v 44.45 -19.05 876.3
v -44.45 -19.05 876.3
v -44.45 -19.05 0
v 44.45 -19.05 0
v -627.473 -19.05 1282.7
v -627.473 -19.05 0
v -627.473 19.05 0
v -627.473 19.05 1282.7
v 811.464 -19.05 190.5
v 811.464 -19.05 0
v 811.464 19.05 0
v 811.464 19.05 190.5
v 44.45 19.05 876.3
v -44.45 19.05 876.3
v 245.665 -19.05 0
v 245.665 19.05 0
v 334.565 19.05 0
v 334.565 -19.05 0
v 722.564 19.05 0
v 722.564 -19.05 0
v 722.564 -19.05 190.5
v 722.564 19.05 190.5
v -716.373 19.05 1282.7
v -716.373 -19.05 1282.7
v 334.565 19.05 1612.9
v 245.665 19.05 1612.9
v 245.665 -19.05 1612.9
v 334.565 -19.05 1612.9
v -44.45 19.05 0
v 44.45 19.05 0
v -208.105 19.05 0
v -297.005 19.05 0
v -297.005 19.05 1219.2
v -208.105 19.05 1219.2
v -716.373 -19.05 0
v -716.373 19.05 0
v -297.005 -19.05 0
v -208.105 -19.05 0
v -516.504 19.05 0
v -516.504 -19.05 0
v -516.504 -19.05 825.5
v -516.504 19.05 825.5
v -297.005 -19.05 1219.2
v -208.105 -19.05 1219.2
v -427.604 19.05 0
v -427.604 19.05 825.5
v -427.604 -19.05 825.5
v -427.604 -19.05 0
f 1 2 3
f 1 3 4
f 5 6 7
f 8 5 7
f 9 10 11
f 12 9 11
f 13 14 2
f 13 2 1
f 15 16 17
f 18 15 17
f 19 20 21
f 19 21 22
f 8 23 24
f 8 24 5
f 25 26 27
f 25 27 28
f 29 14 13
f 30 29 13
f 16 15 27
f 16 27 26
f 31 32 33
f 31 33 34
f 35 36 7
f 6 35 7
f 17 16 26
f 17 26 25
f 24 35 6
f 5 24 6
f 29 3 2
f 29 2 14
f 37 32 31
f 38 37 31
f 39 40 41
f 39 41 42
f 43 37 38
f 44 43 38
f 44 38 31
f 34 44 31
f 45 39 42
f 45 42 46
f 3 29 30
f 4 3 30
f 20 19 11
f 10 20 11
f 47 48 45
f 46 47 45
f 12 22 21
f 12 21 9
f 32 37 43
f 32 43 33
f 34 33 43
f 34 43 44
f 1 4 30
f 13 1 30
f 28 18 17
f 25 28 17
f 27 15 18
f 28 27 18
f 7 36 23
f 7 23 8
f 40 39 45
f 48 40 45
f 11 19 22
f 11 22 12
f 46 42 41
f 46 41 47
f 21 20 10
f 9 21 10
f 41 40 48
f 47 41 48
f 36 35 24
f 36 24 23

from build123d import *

# Parameters (mm, degrees)
F0_W      = 88.9
F0_H      = 38.1
F1_DEPTH  = 876.3
F2_W      = 88.9
F2_H      = 38.1
F3_DEPTH  = 1219.2
F4_W      = 88.9
F4_H      = 38.1
F5_DEPTH  = 1612.9
F6_W      = 88.9
F6_H      = 38.1
F7_DEPTH  = 825.5
F8_W      = 88.9
F8_H      = 38.1
F9_DEPTH  = 190.5
F10_W     = 88.9
F10_H     = 38.1
F11_DEPTH = 1282.7


with BuildPart() as f1:
    # F0 (on Top) → F1 (new body)
    with BuildSketch(Plane.XY):
        Rectangle(F0_W, F0_H)
    extrude(amount=F1_DEPTH)


with BuildPart() as f3:
    # F2 (on Top) → F3 (new body)
    with BuildSketch(Plane.XY):
        with Locations((-252.554866, 0)):
            Rectangle(F2_W, F2_H)
    extrude(amount=F3_DEPTH)


with BuildPart() as f5:
    # F4 (on Top) → F5 (new body)
    with BuildSketch(Plane.XY):
        with Locations((290.114943, 0)):
            Rectangle(F4_W, F4_H)
    extrude(amount=F5_DEPTH)


with BuildPart() as f7:
    # F6 (on Top) → F7 (new body)
    with BuildSketch(Plane.XY):
        with Locations((-472.05397, 0)):
            Rectangle(F6_W, F6_H)
    extrude(amount=F7_DEPTH)


with BuildPart() as f9:
    # F8 (on Top) → F9 (new body)
    with BuildSketch(Plane.XY):
        with Locations((767.014413, 0)):
            Rectangle(F8_W, F8_H)
    extrude(amount=F9_DEPTH)


with BuildPart() as f11:
    # F10 (on Top) → F11 (new body)
    with BuildSketch(Plane.XY):
        with Locations((-671.922533, 0)):
            Rectangle(F10_W, F10_H)
    extrude(amount=F11_DEPTH)


solid = Compound([f1.part, f3.part, f5.part, f7.part, f9.part, f11.part])
